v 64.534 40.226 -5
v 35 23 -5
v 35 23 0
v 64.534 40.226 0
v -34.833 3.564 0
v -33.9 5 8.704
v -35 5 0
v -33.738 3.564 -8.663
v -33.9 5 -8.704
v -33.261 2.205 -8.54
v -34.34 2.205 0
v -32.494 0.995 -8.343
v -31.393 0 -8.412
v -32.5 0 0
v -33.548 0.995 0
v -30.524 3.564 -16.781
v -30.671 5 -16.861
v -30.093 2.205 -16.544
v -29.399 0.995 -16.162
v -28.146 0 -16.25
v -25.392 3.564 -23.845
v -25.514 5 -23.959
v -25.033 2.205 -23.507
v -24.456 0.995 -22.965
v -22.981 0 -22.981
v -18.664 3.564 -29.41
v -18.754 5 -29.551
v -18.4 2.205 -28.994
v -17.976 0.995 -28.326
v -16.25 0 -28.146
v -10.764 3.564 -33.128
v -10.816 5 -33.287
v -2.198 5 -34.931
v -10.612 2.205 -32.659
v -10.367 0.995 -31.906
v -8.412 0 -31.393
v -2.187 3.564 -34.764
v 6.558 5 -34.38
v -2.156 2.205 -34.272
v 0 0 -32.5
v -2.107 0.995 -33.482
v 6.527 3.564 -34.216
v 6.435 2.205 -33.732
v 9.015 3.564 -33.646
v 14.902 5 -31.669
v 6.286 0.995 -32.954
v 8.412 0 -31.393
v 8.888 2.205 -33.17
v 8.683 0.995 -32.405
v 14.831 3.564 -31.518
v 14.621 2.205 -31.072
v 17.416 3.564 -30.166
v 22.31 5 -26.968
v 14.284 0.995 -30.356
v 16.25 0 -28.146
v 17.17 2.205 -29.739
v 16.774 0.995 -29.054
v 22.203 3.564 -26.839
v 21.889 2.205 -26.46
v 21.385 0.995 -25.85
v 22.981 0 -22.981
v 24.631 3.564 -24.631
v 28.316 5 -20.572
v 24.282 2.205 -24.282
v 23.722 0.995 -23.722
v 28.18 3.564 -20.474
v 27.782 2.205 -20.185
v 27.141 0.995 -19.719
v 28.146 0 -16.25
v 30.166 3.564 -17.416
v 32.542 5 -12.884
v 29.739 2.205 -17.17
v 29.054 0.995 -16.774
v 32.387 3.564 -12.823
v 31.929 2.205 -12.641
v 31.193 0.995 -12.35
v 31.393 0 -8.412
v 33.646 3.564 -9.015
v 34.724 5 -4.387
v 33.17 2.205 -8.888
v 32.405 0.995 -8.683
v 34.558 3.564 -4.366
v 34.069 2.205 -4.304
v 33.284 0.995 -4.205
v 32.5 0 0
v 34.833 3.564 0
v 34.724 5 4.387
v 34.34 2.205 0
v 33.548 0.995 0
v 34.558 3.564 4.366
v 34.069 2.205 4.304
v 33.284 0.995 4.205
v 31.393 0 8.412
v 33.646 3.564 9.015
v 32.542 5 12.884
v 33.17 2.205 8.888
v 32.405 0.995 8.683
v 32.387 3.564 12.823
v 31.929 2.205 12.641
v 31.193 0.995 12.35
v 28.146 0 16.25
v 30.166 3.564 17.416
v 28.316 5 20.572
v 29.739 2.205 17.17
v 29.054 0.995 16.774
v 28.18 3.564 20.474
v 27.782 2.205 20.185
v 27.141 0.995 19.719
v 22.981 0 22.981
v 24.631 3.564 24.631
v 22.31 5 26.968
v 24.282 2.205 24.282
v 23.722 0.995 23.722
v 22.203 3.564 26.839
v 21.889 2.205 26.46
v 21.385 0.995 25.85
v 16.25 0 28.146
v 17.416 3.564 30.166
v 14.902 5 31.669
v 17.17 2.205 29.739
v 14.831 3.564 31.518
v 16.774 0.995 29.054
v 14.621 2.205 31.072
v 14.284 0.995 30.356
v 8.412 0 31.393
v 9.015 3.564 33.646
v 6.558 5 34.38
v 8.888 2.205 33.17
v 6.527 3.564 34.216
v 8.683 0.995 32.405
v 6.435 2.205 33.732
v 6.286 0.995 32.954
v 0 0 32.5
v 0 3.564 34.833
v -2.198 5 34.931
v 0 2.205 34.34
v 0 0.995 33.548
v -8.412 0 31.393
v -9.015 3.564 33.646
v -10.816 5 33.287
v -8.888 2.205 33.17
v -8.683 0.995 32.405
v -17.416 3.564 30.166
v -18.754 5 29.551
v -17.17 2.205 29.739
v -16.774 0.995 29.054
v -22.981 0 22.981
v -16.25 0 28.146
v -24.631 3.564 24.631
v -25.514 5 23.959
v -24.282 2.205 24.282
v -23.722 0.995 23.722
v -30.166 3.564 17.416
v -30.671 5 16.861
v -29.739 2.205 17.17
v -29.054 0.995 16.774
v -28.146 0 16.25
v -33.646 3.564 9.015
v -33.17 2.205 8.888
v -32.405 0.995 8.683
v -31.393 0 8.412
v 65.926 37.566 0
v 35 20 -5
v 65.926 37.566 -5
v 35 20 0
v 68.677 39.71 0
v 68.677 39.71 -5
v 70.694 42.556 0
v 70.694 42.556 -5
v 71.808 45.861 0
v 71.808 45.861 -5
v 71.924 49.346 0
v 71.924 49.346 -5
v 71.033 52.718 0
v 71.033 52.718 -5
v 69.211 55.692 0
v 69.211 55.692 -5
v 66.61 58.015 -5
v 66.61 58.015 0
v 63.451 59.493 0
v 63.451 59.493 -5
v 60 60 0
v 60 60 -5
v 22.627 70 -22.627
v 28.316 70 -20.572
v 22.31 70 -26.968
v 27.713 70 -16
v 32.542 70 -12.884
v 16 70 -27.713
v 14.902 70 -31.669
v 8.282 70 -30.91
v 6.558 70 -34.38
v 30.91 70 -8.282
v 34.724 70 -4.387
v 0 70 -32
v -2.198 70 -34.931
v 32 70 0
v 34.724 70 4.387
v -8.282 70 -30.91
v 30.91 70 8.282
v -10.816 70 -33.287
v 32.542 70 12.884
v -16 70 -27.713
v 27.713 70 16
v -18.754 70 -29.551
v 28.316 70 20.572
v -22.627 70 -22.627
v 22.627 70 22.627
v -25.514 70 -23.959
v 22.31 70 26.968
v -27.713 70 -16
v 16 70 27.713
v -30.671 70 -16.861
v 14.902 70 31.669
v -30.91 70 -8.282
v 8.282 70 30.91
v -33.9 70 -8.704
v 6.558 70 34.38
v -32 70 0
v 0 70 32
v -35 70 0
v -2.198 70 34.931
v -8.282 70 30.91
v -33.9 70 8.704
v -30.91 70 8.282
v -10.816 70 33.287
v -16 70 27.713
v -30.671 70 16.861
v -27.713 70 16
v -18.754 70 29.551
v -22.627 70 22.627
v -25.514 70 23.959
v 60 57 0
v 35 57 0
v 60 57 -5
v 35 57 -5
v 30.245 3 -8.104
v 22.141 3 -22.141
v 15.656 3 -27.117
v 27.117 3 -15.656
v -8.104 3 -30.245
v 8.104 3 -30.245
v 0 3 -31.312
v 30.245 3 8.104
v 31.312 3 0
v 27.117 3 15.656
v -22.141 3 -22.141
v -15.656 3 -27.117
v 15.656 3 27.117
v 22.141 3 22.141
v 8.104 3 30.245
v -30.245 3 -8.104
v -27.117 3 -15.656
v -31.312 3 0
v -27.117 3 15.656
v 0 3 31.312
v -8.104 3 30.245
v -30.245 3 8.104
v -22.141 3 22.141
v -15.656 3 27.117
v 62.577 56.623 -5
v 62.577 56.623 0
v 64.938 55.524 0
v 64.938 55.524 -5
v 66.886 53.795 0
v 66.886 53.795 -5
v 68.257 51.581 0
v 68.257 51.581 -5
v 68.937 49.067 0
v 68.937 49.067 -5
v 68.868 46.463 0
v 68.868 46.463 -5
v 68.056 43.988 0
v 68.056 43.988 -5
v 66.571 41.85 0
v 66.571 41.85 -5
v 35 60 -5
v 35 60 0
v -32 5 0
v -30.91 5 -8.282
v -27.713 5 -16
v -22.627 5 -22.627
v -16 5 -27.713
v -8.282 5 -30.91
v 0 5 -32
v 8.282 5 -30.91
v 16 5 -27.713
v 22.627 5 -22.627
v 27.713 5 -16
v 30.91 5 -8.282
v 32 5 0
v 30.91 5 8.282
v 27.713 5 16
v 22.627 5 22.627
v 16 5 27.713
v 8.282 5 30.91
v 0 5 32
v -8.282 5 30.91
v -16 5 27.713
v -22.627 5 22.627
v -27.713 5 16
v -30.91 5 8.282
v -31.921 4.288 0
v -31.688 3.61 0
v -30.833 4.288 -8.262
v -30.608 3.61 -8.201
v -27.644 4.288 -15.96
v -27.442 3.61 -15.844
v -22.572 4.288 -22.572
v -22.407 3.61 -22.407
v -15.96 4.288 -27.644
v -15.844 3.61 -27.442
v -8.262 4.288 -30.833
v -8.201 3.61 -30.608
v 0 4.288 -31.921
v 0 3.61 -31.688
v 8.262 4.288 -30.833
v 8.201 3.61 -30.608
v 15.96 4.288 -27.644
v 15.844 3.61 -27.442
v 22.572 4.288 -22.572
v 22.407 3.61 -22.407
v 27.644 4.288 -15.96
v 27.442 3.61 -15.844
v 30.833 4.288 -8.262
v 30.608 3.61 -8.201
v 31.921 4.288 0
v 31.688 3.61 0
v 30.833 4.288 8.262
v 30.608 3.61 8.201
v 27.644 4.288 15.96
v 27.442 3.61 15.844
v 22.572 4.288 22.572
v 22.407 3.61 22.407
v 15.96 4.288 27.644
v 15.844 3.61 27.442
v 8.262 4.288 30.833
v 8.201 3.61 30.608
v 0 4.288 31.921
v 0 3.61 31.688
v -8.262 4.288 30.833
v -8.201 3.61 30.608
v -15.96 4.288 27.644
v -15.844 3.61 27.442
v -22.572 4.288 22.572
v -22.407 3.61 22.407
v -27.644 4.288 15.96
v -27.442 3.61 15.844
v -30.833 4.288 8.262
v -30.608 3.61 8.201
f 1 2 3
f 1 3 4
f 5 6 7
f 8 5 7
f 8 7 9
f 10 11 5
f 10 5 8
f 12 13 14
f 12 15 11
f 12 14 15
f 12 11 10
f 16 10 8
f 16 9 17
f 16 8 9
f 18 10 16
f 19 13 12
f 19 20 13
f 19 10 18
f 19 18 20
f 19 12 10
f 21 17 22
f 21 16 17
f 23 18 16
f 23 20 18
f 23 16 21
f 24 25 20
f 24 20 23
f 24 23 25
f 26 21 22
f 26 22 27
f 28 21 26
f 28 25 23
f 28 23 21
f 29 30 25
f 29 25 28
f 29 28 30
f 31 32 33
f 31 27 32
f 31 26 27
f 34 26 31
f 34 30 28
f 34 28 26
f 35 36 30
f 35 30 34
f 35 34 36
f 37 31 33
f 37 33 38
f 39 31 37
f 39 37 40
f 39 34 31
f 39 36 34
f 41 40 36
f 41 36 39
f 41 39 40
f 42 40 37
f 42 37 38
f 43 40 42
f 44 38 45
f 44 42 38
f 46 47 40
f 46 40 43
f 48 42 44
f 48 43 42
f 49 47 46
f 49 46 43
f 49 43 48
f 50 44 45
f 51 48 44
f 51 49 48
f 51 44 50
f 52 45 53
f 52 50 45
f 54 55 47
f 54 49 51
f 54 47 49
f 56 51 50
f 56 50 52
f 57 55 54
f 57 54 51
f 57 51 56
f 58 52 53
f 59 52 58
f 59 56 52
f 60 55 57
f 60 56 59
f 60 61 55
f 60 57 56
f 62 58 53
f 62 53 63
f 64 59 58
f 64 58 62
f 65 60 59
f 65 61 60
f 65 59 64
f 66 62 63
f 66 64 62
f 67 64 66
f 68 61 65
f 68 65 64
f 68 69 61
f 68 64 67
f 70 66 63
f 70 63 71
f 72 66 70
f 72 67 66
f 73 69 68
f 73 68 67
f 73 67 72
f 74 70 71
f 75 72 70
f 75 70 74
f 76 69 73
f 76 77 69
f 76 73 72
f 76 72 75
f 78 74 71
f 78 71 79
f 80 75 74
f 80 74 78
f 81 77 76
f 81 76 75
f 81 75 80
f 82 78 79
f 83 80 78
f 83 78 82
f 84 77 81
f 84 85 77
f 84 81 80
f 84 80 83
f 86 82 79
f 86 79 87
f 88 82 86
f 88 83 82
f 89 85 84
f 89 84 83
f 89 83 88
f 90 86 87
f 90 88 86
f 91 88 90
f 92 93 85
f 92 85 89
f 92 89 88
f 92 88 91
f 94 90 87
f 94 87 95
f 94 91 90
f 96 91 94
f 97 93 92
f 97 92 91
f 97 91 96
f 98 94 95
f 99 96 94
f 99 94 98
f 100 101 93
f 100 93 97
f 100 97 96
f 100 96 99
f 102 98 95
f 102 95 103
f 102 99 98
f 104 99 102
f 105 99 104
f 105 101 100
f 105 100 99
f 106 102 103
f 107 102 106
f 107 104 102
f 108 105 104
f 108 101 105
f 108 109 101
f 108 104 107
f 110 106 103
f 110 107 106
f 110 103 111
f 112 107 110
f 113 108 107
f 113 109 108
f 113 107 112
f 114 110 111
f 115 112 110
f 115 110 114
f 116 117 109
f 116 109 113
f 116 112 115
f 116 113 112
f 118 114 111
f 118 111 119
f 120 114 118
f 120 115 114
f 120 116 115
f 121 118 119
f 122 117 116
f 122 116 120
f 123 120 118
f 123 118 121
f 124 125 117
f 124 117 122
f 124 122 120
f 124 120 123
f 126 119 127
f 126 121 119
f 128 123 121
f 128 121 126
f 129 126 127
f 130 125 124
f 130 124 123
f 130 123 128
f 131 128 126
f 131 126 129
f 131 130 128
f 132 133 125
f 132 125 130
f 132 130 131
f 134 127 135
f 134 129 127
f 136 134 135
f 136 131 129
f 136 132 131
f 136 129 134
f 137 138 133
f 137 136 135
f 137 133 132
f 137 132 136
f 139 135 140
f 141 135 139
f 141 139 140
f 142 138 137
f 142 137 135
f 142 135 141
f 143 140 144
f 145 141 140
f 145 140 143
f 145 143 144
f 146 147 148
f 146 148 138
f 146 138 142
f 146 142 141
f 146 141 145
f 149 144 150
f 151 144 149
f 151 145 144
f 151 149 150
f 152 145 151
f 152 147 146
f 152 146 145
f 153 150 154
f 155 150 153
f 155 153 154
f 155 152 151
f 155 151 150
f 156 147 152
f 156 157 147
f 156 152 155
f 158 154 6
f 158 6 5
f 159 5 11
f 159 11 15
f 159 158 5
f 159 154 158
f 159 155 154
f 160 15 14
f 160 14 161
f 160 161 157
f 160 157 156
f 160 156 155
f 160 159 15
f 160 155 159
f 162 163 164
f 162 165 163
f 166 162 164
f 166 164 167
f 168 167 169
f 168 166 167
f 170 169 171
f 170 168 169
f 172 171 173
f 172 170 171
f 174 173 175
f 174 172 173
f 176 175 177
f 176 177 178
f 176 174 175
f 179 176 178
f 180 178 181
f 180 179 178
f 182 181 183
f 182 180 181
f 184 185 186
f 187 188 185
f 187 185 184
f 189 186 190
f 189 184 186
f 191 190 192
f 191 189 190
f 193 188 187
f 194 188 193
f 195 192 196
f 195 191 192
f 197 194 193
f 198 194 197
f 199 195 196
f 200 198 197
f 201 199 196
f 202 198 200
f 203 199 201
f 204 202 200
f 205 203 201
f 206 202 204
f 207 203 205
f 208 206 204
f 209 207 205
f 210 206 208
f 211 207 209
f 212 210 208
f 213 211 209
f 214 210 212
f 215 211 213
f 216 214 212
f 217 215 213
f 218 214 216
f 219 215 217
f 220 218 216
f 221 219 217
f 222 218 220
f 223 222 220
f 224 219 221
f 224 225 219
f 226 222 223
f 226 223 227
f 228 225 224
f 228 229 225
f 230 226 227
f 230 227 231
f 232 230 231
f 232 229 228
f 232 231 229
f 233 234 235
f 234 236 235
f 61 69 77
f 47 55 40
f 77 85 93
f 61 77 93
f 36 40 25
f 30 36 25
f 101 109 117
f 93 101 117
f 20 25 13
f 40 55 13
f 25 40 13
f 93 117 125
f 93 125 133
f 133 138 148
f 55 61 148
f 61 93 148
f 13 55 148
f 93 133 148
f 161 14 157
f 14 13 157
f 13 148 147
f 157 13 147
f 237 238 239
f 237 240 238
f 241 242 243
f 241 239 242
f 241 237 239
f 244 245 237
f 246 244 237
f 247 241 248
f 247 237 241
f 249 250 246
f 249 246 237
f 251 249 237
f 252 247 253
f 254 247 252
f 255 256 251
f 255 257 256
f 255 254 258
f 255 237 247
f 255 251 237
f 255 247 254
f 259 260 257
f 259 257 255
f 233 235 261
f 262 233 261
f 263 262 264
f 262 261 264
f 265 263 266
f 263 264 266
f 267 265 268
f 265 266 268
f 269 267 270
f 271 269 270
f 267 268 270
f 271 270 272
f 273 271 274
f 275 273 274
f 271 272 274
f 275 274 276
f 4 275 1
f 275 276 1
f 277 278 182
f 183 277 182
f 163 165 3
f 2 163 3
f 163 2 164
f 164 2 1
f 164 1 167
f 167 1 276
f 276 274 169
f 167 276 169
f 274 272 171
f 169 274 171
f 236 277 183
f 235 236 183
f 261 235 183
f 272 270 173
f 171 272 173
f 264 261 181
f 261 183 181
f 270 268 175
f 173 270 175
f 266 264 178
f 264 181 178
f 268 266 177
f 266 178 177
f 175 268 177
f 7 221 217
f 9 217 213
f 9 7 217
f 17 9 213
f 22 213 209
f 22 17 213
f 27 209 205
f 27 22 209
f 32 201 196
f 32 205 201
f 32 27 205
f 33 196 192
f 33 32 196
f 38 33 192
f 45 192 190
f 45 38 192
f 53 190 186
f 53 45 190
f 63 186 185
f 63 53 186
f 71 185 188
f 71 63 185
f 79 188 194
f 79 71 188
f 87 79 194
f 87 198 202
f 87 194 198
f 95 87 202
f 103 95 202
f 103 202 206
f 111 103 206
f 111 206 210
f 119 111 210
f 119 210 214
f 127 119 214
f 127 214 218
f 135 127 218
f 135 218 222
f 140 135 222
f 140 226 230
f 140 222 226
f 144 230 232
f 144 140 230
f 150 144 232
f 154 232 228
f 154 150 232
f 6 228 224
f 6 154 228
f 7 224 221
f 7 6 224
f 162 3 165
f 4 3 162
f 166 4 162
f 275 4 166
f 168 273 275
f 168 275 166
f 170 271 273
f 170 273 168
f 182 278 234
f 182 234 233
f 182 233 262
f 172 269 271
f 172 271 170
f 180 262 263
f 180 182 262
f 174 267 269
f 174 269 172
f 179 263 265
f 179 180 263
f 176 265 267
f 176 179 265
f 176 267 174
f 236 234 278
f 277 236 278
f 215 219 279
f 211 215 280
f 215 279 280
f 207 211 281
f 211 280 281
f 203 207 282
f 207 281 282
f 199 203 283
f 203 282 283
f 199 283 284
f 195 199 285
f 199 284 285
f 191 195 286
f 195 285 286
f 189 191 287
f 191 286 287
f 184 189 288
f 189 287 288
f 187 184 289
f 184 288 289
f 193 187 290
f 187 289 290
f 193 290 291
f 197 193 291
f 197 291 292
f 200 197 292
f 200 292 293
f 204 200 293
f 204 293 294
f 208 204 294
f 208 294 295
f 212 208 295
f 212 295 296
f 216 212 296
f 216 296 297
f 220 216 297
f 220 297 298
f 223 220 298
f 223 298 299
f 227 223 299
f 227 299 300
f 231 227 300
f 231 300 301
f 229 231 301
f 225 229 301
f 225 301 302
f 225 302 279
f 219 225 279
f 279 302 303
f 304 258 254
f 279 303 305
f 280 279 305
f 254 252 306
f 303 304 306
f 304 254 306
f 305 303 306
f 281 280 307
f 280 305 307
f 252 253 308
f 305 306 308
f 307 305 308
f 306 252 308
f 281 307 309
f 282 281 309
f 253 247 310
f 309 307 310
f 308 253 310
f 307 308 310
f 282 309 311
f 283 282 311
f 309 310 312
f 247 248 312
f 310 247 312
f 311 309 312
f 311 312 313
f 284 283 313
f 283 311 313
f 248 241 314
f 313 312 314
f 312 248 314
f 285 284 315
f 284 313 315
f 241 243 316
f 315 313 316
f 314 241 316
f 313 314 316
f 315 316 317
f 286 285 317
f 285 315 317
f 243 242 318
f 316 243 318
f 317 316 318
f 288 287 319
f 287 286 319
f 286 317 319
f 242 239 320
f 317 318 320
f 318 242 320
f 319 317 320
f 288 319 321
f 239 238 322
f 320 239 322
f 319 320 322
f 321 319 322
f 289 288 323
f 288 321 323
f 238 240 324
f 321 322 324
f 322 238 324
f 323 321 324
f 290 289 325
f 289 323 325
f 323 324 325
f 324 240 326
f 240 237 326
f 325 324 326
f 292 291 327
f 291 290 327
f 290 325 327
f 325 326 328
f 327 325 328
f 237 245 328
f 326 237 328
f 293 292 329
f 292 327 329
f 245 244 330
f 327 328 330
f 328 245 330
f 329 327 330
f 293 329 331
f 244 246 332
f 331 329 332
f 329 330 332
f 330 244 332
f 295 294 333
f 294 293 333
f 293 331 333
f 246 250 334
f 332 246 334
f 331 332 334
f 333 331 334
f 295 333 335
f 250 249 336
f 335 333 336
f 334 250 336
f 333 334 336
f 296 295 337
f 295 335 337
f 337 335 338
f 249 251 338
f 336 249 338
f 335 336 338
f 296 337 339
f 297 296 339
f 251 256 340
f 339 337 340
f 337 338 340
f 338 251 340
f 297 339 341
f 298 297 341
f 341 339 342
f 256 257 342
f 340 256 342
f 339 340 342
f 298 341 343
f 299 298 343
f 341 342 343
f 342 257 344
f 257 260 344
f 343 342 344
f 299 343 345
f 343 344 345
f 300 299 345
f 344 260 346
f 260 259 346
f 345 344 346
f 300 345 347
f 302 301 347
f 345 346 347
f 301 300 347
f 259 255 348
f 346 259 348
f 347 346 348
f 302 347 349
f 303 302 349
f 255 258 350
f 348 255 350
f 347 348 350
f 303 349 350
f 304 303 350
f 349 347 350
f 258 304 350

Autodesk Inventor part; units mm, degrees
ref_plane "XZ Plane" through (0, 0, 0) normal (0, 1, 0) x (-1, 0, 0)
sketch "Boceto1" plane through (0, 0, 0) normal (0, 0, 1) x (1, 0, 0)
  line L0 (0, 0) -> (0, 70)
  line L1 (0, 70) -> (-35, 70)
  line L2 (-35, 70) -> (-35, 5)
  line L3 (0, 0) -> (-32.5, 0)
  arc A0 (-35, 5) -> (-32.5, 0) centre (-28.75, 5) ccw
revolve "Revolución1" add sketch "Boceto1" angle 360 about axis through (0, 0, 0) along (0, 1, 0)
shell "Vaciado2" thickness 3 removed faces 1 at (-0.2748, 70, -9.3581)
sketch "Boceto2" plane through (0, 0, 0) normal (0, 0, 1) x (1, 0, 0)
  line L0 (35, 5) -> (35, 70) projected
  line L1 (35, 70) -> (35, 60)
  line L2 (35, 60) -> (60, 60)
  line L3 (35, 5) -> (35, 20)
  arc A0 (65.9265, 37.5656) -> (60, 60) centre (60, 48) ccw
  line L4 (35, 20) -> (65.9265, 37.5656)
  line L5 (35, 60) -> (35, 57)
  line L6 (35, 60) -> (35, 57)
  line L7 (35, 57) -> (60, 57)
  arc A1 (65.2003, 40.6545) -> (60, 57) centre (60, 48) ccw
  line L8 (35, 20) -> (35, 23)
  line L9 (35, 5) -> (35, 70) projected
  line L10 (35, 23) -> (65.2003, 40.6545)
  point P0 (0, 0)
  dimension "d11" = 10
  dimension "d12" = 25
  dimension "d13" = 15
  dimension "d20" = 12
  dimension "d23" = 3
  dimension "d24" = 3
  dimension "d26" = 3
ref_plane "Plano de trabajo7" through (60, 60, 0) normal (0, 0, 1) x (1, 0, 0)
ref_plane "Plano de trabajo8" through (35, 60, 0) normal (1, 0, 0) x (0, 1, 0)
extrude "Extrusión1" add sketch "Boceto2" against normal blind 5
sketch "Boceto5" plane through (0, 0, -5) normal (0, 0, -1) x (-1, 0, 0)
  point P0 (0, 0)
sketch "Boceto6" plane through (0, 0, -5) normal (0, 0, -1) x (-1, 0, 0)
  line L0 (-35, 20) -> (-35, 60) projected
  line L1 (-35, 20) -> (-35, 23)
  line L2 (-35, 60) -> (-60, 60) projected
  line L3 (-35, 60) -> (-35, 57)
  line L4 (-35, 57) -> (-60, 57)
  arc A0 (-60, 57) -> (-63.3814, 39.6594) centre (-60, 48) ccw
  arc A1 (-63.3814, 39.6594) -> (-64.5343, 40.2257) centre (-60, 48) ccw
  line L5 (-35, 23) -> (-64.5343, 40.2257)
  line L6 (-35, 57) -> (-35, 23)
  point P0 (0, 0)
  dimension "d27" = 3
  dimension "d28" = 3
  dimension "d29" = 25
  dimension "d30" = 9
extrude "Extrusión2" cut sketch "Boceto6" against normal blind 5
properties part number "Actividad 2 Lab Dinámica Alison Martínez"
